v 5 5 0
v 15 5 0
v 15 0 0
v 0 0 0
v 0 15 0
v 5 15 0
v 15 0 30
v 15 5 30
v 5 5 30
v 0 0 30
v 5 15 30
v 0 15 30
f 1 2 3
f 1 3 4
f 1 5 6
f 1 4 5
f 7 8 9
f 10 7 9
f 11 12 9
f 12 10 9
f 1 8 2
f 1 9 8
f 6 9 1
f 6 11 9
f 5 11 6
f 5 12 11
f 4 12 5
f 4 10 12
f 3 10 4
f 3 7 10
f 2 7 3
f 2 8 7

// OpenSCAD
// 90 degree mountplate fpr quad robot 1 per leg 
// Thomas Garside 2019 

plateLen=30;
 
linear_extrude(height =plateLen){
polygon(points=[[0,0],
                [plateLen/2,0],
                [plateLen/2,plateLen/6],
                [plateLen/6,plateLen/6],  
                [plateLen/6,plateLen/2],
                [0,plateLen/2]]);
}
